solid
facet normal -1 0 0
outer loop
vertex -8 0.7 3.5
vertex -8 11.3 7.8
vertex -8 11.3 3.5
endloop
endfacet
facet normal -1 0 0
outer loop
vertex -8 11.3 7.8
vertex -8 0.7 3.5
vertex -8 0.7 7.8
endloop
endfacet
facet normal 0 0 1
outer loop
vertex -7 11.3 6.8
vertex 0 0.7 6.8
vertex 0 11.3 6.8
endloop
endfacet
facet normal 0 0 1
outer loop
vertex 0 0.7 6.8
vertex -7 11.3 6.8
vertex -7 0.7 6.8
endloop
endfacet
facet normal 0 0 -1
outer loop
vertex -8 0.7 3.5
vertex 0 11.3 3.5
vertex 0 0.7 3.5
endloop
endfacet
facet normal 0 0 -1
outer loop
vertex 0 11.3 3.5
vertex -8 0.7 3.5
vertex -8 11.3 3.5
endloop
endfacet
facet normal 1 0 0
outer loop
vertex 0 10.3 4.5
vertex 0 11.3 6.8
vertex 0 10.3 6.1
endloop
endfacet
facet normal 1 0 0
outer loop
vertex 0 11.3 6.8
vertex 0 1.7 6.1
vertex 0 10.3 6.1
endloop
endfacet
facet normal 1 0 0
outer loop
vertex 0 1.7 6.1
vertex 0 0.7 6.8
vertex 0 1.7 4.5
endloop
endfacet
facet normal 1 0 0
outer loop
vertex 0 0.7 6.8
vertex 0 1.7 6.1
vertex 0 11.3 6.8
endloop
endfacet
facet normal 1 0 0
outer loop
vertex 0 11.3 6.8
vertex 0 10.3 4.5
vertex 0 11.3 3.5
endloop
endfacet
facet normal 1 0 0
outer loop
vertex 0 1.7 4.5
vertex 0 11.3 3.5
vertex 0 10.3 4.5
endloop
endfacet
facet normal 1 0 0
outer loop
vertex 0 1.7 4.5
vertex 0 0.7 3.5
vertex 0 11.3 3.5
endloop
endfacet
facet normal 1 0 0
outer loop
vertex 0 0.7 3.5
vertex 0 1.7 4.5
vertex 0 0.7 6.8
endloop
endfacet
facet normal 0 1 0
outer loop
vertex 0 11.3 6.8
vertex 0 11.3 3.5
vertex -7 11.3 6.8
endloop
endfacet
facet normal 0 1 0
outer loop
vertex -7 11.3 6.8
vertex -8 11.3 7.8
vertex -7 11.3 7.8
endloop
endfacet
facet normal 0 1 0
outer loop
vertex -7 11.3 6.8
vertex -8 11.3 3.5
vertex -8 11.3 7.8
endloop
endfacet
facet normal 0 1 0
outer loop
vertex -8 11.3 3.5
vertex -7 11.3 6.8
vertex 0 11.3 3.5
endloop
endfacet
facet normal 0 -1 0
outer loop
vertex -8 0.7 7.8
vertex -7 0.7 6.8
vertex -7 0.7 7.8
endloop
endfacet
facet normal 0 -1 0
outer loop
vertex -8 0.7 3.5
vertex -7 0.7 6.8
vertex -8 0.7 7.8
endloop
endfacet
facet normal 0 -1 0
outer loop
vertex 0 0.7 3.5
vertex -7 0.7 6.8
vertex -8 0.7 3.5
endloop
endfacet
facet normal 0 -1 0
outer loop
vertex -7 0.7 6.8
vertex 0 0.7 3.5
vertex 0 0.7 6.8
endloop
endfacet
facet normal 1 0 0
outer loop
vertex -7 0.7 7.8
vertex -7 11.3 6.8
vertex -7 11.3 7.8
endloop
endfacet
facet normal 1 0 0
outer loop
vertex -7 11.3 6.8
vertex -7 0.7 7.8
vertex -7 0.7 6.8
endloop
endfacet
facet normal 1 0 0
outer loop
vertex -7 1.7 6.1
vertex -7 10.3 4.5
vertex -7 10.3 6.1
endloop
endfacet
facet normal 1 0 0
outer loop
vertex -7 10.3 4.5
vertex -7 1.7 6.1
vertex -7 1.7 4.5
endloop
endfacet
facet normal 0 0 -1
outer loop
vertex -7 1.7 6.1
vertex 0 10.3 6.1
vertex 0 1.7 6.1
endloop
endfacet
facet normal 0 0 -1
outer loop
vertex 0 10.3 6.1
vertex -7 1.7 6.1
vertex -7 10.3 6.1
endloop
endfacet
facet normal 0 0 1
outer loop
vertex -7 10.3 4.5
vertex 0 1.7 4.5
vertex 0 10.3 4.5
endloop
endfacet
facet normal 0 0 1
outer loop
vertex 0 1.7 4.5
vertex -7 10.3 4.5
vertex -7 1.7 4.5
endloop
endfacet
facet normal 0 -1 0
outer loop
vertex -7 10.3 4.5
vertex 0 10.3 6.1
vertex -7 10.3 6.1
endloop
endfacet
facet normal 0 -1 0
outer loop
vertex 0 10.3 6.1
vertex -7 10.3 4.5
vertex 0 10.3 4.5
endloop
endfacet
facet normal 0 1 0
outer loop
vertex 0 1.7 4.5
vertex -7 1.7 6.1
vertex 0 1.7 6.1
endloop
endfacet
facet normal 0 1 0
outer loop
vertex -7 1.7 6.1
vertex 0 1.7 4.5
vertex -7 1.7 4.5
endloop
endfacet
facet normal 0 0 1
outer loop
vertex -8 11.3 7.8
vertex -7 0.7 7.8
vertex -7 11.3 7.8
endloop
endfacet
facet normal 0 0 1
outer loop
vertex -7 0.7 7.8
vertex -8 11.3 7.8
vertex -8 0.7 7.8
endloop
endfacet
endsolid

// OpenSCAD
include <parameters.scad>

module end_stop_right_geometry() {
    union() {
        // Flange-only insertion sleeve. The cavity is open at local X=0,
        // allowing the rail end to enter; the solid back is the stop plate.
        difference() {
            translate([0, end_stop_outer_y0, end_stop_outer_z0])
                cube([end_stop_socket_length,
                      end_stop_outer_y1 - end_stop_outer_y0,
                      end_stop_outer_z1 - end_stop_outer_z0]);
            translate([-join_overlap, end_stop_inner_y0, end_stop_inner_z0])
                cube([end_stop_socket_length - end_stop_plate_thickness
                          + join_overlap,
                      end_stop_inner_y1 - end_stop_inner_y0,
                      end_stop_inner_z1 - end_stop_inner_z0]);
        }

        // Person-facing stop lip. It does not descend to the mounting plane.
        translate([end_stop_socket_length - end_stop_plate_thickness,
                   end_stop_outer_y0, end_stop_outer_z0])
            cube([end_stop_plate_thickness,
                  end_stop_outer_y1 - end_stop_outer_y0,
                  end_stop_lip_z1 - end_stop_outer_z0]);
    }
}

module end_stop_geometry(side="right") {
    if (side == "left")
        mirror([1, 0, 0]) end_stop_right_geometry();
    else
        end_stop_right_geometry();
}

// Standalone printable selector. CLI override examples are in README.md.
if (end_stop_part == "left")
    end_stop_geometry("left");
else if (end_stop_part == "right")
    end_stop_geometry("right");
else {
    end_stop_geometry("left");
    translate([rail_length, 0, 0]) end_stop_geometry("right");
}
